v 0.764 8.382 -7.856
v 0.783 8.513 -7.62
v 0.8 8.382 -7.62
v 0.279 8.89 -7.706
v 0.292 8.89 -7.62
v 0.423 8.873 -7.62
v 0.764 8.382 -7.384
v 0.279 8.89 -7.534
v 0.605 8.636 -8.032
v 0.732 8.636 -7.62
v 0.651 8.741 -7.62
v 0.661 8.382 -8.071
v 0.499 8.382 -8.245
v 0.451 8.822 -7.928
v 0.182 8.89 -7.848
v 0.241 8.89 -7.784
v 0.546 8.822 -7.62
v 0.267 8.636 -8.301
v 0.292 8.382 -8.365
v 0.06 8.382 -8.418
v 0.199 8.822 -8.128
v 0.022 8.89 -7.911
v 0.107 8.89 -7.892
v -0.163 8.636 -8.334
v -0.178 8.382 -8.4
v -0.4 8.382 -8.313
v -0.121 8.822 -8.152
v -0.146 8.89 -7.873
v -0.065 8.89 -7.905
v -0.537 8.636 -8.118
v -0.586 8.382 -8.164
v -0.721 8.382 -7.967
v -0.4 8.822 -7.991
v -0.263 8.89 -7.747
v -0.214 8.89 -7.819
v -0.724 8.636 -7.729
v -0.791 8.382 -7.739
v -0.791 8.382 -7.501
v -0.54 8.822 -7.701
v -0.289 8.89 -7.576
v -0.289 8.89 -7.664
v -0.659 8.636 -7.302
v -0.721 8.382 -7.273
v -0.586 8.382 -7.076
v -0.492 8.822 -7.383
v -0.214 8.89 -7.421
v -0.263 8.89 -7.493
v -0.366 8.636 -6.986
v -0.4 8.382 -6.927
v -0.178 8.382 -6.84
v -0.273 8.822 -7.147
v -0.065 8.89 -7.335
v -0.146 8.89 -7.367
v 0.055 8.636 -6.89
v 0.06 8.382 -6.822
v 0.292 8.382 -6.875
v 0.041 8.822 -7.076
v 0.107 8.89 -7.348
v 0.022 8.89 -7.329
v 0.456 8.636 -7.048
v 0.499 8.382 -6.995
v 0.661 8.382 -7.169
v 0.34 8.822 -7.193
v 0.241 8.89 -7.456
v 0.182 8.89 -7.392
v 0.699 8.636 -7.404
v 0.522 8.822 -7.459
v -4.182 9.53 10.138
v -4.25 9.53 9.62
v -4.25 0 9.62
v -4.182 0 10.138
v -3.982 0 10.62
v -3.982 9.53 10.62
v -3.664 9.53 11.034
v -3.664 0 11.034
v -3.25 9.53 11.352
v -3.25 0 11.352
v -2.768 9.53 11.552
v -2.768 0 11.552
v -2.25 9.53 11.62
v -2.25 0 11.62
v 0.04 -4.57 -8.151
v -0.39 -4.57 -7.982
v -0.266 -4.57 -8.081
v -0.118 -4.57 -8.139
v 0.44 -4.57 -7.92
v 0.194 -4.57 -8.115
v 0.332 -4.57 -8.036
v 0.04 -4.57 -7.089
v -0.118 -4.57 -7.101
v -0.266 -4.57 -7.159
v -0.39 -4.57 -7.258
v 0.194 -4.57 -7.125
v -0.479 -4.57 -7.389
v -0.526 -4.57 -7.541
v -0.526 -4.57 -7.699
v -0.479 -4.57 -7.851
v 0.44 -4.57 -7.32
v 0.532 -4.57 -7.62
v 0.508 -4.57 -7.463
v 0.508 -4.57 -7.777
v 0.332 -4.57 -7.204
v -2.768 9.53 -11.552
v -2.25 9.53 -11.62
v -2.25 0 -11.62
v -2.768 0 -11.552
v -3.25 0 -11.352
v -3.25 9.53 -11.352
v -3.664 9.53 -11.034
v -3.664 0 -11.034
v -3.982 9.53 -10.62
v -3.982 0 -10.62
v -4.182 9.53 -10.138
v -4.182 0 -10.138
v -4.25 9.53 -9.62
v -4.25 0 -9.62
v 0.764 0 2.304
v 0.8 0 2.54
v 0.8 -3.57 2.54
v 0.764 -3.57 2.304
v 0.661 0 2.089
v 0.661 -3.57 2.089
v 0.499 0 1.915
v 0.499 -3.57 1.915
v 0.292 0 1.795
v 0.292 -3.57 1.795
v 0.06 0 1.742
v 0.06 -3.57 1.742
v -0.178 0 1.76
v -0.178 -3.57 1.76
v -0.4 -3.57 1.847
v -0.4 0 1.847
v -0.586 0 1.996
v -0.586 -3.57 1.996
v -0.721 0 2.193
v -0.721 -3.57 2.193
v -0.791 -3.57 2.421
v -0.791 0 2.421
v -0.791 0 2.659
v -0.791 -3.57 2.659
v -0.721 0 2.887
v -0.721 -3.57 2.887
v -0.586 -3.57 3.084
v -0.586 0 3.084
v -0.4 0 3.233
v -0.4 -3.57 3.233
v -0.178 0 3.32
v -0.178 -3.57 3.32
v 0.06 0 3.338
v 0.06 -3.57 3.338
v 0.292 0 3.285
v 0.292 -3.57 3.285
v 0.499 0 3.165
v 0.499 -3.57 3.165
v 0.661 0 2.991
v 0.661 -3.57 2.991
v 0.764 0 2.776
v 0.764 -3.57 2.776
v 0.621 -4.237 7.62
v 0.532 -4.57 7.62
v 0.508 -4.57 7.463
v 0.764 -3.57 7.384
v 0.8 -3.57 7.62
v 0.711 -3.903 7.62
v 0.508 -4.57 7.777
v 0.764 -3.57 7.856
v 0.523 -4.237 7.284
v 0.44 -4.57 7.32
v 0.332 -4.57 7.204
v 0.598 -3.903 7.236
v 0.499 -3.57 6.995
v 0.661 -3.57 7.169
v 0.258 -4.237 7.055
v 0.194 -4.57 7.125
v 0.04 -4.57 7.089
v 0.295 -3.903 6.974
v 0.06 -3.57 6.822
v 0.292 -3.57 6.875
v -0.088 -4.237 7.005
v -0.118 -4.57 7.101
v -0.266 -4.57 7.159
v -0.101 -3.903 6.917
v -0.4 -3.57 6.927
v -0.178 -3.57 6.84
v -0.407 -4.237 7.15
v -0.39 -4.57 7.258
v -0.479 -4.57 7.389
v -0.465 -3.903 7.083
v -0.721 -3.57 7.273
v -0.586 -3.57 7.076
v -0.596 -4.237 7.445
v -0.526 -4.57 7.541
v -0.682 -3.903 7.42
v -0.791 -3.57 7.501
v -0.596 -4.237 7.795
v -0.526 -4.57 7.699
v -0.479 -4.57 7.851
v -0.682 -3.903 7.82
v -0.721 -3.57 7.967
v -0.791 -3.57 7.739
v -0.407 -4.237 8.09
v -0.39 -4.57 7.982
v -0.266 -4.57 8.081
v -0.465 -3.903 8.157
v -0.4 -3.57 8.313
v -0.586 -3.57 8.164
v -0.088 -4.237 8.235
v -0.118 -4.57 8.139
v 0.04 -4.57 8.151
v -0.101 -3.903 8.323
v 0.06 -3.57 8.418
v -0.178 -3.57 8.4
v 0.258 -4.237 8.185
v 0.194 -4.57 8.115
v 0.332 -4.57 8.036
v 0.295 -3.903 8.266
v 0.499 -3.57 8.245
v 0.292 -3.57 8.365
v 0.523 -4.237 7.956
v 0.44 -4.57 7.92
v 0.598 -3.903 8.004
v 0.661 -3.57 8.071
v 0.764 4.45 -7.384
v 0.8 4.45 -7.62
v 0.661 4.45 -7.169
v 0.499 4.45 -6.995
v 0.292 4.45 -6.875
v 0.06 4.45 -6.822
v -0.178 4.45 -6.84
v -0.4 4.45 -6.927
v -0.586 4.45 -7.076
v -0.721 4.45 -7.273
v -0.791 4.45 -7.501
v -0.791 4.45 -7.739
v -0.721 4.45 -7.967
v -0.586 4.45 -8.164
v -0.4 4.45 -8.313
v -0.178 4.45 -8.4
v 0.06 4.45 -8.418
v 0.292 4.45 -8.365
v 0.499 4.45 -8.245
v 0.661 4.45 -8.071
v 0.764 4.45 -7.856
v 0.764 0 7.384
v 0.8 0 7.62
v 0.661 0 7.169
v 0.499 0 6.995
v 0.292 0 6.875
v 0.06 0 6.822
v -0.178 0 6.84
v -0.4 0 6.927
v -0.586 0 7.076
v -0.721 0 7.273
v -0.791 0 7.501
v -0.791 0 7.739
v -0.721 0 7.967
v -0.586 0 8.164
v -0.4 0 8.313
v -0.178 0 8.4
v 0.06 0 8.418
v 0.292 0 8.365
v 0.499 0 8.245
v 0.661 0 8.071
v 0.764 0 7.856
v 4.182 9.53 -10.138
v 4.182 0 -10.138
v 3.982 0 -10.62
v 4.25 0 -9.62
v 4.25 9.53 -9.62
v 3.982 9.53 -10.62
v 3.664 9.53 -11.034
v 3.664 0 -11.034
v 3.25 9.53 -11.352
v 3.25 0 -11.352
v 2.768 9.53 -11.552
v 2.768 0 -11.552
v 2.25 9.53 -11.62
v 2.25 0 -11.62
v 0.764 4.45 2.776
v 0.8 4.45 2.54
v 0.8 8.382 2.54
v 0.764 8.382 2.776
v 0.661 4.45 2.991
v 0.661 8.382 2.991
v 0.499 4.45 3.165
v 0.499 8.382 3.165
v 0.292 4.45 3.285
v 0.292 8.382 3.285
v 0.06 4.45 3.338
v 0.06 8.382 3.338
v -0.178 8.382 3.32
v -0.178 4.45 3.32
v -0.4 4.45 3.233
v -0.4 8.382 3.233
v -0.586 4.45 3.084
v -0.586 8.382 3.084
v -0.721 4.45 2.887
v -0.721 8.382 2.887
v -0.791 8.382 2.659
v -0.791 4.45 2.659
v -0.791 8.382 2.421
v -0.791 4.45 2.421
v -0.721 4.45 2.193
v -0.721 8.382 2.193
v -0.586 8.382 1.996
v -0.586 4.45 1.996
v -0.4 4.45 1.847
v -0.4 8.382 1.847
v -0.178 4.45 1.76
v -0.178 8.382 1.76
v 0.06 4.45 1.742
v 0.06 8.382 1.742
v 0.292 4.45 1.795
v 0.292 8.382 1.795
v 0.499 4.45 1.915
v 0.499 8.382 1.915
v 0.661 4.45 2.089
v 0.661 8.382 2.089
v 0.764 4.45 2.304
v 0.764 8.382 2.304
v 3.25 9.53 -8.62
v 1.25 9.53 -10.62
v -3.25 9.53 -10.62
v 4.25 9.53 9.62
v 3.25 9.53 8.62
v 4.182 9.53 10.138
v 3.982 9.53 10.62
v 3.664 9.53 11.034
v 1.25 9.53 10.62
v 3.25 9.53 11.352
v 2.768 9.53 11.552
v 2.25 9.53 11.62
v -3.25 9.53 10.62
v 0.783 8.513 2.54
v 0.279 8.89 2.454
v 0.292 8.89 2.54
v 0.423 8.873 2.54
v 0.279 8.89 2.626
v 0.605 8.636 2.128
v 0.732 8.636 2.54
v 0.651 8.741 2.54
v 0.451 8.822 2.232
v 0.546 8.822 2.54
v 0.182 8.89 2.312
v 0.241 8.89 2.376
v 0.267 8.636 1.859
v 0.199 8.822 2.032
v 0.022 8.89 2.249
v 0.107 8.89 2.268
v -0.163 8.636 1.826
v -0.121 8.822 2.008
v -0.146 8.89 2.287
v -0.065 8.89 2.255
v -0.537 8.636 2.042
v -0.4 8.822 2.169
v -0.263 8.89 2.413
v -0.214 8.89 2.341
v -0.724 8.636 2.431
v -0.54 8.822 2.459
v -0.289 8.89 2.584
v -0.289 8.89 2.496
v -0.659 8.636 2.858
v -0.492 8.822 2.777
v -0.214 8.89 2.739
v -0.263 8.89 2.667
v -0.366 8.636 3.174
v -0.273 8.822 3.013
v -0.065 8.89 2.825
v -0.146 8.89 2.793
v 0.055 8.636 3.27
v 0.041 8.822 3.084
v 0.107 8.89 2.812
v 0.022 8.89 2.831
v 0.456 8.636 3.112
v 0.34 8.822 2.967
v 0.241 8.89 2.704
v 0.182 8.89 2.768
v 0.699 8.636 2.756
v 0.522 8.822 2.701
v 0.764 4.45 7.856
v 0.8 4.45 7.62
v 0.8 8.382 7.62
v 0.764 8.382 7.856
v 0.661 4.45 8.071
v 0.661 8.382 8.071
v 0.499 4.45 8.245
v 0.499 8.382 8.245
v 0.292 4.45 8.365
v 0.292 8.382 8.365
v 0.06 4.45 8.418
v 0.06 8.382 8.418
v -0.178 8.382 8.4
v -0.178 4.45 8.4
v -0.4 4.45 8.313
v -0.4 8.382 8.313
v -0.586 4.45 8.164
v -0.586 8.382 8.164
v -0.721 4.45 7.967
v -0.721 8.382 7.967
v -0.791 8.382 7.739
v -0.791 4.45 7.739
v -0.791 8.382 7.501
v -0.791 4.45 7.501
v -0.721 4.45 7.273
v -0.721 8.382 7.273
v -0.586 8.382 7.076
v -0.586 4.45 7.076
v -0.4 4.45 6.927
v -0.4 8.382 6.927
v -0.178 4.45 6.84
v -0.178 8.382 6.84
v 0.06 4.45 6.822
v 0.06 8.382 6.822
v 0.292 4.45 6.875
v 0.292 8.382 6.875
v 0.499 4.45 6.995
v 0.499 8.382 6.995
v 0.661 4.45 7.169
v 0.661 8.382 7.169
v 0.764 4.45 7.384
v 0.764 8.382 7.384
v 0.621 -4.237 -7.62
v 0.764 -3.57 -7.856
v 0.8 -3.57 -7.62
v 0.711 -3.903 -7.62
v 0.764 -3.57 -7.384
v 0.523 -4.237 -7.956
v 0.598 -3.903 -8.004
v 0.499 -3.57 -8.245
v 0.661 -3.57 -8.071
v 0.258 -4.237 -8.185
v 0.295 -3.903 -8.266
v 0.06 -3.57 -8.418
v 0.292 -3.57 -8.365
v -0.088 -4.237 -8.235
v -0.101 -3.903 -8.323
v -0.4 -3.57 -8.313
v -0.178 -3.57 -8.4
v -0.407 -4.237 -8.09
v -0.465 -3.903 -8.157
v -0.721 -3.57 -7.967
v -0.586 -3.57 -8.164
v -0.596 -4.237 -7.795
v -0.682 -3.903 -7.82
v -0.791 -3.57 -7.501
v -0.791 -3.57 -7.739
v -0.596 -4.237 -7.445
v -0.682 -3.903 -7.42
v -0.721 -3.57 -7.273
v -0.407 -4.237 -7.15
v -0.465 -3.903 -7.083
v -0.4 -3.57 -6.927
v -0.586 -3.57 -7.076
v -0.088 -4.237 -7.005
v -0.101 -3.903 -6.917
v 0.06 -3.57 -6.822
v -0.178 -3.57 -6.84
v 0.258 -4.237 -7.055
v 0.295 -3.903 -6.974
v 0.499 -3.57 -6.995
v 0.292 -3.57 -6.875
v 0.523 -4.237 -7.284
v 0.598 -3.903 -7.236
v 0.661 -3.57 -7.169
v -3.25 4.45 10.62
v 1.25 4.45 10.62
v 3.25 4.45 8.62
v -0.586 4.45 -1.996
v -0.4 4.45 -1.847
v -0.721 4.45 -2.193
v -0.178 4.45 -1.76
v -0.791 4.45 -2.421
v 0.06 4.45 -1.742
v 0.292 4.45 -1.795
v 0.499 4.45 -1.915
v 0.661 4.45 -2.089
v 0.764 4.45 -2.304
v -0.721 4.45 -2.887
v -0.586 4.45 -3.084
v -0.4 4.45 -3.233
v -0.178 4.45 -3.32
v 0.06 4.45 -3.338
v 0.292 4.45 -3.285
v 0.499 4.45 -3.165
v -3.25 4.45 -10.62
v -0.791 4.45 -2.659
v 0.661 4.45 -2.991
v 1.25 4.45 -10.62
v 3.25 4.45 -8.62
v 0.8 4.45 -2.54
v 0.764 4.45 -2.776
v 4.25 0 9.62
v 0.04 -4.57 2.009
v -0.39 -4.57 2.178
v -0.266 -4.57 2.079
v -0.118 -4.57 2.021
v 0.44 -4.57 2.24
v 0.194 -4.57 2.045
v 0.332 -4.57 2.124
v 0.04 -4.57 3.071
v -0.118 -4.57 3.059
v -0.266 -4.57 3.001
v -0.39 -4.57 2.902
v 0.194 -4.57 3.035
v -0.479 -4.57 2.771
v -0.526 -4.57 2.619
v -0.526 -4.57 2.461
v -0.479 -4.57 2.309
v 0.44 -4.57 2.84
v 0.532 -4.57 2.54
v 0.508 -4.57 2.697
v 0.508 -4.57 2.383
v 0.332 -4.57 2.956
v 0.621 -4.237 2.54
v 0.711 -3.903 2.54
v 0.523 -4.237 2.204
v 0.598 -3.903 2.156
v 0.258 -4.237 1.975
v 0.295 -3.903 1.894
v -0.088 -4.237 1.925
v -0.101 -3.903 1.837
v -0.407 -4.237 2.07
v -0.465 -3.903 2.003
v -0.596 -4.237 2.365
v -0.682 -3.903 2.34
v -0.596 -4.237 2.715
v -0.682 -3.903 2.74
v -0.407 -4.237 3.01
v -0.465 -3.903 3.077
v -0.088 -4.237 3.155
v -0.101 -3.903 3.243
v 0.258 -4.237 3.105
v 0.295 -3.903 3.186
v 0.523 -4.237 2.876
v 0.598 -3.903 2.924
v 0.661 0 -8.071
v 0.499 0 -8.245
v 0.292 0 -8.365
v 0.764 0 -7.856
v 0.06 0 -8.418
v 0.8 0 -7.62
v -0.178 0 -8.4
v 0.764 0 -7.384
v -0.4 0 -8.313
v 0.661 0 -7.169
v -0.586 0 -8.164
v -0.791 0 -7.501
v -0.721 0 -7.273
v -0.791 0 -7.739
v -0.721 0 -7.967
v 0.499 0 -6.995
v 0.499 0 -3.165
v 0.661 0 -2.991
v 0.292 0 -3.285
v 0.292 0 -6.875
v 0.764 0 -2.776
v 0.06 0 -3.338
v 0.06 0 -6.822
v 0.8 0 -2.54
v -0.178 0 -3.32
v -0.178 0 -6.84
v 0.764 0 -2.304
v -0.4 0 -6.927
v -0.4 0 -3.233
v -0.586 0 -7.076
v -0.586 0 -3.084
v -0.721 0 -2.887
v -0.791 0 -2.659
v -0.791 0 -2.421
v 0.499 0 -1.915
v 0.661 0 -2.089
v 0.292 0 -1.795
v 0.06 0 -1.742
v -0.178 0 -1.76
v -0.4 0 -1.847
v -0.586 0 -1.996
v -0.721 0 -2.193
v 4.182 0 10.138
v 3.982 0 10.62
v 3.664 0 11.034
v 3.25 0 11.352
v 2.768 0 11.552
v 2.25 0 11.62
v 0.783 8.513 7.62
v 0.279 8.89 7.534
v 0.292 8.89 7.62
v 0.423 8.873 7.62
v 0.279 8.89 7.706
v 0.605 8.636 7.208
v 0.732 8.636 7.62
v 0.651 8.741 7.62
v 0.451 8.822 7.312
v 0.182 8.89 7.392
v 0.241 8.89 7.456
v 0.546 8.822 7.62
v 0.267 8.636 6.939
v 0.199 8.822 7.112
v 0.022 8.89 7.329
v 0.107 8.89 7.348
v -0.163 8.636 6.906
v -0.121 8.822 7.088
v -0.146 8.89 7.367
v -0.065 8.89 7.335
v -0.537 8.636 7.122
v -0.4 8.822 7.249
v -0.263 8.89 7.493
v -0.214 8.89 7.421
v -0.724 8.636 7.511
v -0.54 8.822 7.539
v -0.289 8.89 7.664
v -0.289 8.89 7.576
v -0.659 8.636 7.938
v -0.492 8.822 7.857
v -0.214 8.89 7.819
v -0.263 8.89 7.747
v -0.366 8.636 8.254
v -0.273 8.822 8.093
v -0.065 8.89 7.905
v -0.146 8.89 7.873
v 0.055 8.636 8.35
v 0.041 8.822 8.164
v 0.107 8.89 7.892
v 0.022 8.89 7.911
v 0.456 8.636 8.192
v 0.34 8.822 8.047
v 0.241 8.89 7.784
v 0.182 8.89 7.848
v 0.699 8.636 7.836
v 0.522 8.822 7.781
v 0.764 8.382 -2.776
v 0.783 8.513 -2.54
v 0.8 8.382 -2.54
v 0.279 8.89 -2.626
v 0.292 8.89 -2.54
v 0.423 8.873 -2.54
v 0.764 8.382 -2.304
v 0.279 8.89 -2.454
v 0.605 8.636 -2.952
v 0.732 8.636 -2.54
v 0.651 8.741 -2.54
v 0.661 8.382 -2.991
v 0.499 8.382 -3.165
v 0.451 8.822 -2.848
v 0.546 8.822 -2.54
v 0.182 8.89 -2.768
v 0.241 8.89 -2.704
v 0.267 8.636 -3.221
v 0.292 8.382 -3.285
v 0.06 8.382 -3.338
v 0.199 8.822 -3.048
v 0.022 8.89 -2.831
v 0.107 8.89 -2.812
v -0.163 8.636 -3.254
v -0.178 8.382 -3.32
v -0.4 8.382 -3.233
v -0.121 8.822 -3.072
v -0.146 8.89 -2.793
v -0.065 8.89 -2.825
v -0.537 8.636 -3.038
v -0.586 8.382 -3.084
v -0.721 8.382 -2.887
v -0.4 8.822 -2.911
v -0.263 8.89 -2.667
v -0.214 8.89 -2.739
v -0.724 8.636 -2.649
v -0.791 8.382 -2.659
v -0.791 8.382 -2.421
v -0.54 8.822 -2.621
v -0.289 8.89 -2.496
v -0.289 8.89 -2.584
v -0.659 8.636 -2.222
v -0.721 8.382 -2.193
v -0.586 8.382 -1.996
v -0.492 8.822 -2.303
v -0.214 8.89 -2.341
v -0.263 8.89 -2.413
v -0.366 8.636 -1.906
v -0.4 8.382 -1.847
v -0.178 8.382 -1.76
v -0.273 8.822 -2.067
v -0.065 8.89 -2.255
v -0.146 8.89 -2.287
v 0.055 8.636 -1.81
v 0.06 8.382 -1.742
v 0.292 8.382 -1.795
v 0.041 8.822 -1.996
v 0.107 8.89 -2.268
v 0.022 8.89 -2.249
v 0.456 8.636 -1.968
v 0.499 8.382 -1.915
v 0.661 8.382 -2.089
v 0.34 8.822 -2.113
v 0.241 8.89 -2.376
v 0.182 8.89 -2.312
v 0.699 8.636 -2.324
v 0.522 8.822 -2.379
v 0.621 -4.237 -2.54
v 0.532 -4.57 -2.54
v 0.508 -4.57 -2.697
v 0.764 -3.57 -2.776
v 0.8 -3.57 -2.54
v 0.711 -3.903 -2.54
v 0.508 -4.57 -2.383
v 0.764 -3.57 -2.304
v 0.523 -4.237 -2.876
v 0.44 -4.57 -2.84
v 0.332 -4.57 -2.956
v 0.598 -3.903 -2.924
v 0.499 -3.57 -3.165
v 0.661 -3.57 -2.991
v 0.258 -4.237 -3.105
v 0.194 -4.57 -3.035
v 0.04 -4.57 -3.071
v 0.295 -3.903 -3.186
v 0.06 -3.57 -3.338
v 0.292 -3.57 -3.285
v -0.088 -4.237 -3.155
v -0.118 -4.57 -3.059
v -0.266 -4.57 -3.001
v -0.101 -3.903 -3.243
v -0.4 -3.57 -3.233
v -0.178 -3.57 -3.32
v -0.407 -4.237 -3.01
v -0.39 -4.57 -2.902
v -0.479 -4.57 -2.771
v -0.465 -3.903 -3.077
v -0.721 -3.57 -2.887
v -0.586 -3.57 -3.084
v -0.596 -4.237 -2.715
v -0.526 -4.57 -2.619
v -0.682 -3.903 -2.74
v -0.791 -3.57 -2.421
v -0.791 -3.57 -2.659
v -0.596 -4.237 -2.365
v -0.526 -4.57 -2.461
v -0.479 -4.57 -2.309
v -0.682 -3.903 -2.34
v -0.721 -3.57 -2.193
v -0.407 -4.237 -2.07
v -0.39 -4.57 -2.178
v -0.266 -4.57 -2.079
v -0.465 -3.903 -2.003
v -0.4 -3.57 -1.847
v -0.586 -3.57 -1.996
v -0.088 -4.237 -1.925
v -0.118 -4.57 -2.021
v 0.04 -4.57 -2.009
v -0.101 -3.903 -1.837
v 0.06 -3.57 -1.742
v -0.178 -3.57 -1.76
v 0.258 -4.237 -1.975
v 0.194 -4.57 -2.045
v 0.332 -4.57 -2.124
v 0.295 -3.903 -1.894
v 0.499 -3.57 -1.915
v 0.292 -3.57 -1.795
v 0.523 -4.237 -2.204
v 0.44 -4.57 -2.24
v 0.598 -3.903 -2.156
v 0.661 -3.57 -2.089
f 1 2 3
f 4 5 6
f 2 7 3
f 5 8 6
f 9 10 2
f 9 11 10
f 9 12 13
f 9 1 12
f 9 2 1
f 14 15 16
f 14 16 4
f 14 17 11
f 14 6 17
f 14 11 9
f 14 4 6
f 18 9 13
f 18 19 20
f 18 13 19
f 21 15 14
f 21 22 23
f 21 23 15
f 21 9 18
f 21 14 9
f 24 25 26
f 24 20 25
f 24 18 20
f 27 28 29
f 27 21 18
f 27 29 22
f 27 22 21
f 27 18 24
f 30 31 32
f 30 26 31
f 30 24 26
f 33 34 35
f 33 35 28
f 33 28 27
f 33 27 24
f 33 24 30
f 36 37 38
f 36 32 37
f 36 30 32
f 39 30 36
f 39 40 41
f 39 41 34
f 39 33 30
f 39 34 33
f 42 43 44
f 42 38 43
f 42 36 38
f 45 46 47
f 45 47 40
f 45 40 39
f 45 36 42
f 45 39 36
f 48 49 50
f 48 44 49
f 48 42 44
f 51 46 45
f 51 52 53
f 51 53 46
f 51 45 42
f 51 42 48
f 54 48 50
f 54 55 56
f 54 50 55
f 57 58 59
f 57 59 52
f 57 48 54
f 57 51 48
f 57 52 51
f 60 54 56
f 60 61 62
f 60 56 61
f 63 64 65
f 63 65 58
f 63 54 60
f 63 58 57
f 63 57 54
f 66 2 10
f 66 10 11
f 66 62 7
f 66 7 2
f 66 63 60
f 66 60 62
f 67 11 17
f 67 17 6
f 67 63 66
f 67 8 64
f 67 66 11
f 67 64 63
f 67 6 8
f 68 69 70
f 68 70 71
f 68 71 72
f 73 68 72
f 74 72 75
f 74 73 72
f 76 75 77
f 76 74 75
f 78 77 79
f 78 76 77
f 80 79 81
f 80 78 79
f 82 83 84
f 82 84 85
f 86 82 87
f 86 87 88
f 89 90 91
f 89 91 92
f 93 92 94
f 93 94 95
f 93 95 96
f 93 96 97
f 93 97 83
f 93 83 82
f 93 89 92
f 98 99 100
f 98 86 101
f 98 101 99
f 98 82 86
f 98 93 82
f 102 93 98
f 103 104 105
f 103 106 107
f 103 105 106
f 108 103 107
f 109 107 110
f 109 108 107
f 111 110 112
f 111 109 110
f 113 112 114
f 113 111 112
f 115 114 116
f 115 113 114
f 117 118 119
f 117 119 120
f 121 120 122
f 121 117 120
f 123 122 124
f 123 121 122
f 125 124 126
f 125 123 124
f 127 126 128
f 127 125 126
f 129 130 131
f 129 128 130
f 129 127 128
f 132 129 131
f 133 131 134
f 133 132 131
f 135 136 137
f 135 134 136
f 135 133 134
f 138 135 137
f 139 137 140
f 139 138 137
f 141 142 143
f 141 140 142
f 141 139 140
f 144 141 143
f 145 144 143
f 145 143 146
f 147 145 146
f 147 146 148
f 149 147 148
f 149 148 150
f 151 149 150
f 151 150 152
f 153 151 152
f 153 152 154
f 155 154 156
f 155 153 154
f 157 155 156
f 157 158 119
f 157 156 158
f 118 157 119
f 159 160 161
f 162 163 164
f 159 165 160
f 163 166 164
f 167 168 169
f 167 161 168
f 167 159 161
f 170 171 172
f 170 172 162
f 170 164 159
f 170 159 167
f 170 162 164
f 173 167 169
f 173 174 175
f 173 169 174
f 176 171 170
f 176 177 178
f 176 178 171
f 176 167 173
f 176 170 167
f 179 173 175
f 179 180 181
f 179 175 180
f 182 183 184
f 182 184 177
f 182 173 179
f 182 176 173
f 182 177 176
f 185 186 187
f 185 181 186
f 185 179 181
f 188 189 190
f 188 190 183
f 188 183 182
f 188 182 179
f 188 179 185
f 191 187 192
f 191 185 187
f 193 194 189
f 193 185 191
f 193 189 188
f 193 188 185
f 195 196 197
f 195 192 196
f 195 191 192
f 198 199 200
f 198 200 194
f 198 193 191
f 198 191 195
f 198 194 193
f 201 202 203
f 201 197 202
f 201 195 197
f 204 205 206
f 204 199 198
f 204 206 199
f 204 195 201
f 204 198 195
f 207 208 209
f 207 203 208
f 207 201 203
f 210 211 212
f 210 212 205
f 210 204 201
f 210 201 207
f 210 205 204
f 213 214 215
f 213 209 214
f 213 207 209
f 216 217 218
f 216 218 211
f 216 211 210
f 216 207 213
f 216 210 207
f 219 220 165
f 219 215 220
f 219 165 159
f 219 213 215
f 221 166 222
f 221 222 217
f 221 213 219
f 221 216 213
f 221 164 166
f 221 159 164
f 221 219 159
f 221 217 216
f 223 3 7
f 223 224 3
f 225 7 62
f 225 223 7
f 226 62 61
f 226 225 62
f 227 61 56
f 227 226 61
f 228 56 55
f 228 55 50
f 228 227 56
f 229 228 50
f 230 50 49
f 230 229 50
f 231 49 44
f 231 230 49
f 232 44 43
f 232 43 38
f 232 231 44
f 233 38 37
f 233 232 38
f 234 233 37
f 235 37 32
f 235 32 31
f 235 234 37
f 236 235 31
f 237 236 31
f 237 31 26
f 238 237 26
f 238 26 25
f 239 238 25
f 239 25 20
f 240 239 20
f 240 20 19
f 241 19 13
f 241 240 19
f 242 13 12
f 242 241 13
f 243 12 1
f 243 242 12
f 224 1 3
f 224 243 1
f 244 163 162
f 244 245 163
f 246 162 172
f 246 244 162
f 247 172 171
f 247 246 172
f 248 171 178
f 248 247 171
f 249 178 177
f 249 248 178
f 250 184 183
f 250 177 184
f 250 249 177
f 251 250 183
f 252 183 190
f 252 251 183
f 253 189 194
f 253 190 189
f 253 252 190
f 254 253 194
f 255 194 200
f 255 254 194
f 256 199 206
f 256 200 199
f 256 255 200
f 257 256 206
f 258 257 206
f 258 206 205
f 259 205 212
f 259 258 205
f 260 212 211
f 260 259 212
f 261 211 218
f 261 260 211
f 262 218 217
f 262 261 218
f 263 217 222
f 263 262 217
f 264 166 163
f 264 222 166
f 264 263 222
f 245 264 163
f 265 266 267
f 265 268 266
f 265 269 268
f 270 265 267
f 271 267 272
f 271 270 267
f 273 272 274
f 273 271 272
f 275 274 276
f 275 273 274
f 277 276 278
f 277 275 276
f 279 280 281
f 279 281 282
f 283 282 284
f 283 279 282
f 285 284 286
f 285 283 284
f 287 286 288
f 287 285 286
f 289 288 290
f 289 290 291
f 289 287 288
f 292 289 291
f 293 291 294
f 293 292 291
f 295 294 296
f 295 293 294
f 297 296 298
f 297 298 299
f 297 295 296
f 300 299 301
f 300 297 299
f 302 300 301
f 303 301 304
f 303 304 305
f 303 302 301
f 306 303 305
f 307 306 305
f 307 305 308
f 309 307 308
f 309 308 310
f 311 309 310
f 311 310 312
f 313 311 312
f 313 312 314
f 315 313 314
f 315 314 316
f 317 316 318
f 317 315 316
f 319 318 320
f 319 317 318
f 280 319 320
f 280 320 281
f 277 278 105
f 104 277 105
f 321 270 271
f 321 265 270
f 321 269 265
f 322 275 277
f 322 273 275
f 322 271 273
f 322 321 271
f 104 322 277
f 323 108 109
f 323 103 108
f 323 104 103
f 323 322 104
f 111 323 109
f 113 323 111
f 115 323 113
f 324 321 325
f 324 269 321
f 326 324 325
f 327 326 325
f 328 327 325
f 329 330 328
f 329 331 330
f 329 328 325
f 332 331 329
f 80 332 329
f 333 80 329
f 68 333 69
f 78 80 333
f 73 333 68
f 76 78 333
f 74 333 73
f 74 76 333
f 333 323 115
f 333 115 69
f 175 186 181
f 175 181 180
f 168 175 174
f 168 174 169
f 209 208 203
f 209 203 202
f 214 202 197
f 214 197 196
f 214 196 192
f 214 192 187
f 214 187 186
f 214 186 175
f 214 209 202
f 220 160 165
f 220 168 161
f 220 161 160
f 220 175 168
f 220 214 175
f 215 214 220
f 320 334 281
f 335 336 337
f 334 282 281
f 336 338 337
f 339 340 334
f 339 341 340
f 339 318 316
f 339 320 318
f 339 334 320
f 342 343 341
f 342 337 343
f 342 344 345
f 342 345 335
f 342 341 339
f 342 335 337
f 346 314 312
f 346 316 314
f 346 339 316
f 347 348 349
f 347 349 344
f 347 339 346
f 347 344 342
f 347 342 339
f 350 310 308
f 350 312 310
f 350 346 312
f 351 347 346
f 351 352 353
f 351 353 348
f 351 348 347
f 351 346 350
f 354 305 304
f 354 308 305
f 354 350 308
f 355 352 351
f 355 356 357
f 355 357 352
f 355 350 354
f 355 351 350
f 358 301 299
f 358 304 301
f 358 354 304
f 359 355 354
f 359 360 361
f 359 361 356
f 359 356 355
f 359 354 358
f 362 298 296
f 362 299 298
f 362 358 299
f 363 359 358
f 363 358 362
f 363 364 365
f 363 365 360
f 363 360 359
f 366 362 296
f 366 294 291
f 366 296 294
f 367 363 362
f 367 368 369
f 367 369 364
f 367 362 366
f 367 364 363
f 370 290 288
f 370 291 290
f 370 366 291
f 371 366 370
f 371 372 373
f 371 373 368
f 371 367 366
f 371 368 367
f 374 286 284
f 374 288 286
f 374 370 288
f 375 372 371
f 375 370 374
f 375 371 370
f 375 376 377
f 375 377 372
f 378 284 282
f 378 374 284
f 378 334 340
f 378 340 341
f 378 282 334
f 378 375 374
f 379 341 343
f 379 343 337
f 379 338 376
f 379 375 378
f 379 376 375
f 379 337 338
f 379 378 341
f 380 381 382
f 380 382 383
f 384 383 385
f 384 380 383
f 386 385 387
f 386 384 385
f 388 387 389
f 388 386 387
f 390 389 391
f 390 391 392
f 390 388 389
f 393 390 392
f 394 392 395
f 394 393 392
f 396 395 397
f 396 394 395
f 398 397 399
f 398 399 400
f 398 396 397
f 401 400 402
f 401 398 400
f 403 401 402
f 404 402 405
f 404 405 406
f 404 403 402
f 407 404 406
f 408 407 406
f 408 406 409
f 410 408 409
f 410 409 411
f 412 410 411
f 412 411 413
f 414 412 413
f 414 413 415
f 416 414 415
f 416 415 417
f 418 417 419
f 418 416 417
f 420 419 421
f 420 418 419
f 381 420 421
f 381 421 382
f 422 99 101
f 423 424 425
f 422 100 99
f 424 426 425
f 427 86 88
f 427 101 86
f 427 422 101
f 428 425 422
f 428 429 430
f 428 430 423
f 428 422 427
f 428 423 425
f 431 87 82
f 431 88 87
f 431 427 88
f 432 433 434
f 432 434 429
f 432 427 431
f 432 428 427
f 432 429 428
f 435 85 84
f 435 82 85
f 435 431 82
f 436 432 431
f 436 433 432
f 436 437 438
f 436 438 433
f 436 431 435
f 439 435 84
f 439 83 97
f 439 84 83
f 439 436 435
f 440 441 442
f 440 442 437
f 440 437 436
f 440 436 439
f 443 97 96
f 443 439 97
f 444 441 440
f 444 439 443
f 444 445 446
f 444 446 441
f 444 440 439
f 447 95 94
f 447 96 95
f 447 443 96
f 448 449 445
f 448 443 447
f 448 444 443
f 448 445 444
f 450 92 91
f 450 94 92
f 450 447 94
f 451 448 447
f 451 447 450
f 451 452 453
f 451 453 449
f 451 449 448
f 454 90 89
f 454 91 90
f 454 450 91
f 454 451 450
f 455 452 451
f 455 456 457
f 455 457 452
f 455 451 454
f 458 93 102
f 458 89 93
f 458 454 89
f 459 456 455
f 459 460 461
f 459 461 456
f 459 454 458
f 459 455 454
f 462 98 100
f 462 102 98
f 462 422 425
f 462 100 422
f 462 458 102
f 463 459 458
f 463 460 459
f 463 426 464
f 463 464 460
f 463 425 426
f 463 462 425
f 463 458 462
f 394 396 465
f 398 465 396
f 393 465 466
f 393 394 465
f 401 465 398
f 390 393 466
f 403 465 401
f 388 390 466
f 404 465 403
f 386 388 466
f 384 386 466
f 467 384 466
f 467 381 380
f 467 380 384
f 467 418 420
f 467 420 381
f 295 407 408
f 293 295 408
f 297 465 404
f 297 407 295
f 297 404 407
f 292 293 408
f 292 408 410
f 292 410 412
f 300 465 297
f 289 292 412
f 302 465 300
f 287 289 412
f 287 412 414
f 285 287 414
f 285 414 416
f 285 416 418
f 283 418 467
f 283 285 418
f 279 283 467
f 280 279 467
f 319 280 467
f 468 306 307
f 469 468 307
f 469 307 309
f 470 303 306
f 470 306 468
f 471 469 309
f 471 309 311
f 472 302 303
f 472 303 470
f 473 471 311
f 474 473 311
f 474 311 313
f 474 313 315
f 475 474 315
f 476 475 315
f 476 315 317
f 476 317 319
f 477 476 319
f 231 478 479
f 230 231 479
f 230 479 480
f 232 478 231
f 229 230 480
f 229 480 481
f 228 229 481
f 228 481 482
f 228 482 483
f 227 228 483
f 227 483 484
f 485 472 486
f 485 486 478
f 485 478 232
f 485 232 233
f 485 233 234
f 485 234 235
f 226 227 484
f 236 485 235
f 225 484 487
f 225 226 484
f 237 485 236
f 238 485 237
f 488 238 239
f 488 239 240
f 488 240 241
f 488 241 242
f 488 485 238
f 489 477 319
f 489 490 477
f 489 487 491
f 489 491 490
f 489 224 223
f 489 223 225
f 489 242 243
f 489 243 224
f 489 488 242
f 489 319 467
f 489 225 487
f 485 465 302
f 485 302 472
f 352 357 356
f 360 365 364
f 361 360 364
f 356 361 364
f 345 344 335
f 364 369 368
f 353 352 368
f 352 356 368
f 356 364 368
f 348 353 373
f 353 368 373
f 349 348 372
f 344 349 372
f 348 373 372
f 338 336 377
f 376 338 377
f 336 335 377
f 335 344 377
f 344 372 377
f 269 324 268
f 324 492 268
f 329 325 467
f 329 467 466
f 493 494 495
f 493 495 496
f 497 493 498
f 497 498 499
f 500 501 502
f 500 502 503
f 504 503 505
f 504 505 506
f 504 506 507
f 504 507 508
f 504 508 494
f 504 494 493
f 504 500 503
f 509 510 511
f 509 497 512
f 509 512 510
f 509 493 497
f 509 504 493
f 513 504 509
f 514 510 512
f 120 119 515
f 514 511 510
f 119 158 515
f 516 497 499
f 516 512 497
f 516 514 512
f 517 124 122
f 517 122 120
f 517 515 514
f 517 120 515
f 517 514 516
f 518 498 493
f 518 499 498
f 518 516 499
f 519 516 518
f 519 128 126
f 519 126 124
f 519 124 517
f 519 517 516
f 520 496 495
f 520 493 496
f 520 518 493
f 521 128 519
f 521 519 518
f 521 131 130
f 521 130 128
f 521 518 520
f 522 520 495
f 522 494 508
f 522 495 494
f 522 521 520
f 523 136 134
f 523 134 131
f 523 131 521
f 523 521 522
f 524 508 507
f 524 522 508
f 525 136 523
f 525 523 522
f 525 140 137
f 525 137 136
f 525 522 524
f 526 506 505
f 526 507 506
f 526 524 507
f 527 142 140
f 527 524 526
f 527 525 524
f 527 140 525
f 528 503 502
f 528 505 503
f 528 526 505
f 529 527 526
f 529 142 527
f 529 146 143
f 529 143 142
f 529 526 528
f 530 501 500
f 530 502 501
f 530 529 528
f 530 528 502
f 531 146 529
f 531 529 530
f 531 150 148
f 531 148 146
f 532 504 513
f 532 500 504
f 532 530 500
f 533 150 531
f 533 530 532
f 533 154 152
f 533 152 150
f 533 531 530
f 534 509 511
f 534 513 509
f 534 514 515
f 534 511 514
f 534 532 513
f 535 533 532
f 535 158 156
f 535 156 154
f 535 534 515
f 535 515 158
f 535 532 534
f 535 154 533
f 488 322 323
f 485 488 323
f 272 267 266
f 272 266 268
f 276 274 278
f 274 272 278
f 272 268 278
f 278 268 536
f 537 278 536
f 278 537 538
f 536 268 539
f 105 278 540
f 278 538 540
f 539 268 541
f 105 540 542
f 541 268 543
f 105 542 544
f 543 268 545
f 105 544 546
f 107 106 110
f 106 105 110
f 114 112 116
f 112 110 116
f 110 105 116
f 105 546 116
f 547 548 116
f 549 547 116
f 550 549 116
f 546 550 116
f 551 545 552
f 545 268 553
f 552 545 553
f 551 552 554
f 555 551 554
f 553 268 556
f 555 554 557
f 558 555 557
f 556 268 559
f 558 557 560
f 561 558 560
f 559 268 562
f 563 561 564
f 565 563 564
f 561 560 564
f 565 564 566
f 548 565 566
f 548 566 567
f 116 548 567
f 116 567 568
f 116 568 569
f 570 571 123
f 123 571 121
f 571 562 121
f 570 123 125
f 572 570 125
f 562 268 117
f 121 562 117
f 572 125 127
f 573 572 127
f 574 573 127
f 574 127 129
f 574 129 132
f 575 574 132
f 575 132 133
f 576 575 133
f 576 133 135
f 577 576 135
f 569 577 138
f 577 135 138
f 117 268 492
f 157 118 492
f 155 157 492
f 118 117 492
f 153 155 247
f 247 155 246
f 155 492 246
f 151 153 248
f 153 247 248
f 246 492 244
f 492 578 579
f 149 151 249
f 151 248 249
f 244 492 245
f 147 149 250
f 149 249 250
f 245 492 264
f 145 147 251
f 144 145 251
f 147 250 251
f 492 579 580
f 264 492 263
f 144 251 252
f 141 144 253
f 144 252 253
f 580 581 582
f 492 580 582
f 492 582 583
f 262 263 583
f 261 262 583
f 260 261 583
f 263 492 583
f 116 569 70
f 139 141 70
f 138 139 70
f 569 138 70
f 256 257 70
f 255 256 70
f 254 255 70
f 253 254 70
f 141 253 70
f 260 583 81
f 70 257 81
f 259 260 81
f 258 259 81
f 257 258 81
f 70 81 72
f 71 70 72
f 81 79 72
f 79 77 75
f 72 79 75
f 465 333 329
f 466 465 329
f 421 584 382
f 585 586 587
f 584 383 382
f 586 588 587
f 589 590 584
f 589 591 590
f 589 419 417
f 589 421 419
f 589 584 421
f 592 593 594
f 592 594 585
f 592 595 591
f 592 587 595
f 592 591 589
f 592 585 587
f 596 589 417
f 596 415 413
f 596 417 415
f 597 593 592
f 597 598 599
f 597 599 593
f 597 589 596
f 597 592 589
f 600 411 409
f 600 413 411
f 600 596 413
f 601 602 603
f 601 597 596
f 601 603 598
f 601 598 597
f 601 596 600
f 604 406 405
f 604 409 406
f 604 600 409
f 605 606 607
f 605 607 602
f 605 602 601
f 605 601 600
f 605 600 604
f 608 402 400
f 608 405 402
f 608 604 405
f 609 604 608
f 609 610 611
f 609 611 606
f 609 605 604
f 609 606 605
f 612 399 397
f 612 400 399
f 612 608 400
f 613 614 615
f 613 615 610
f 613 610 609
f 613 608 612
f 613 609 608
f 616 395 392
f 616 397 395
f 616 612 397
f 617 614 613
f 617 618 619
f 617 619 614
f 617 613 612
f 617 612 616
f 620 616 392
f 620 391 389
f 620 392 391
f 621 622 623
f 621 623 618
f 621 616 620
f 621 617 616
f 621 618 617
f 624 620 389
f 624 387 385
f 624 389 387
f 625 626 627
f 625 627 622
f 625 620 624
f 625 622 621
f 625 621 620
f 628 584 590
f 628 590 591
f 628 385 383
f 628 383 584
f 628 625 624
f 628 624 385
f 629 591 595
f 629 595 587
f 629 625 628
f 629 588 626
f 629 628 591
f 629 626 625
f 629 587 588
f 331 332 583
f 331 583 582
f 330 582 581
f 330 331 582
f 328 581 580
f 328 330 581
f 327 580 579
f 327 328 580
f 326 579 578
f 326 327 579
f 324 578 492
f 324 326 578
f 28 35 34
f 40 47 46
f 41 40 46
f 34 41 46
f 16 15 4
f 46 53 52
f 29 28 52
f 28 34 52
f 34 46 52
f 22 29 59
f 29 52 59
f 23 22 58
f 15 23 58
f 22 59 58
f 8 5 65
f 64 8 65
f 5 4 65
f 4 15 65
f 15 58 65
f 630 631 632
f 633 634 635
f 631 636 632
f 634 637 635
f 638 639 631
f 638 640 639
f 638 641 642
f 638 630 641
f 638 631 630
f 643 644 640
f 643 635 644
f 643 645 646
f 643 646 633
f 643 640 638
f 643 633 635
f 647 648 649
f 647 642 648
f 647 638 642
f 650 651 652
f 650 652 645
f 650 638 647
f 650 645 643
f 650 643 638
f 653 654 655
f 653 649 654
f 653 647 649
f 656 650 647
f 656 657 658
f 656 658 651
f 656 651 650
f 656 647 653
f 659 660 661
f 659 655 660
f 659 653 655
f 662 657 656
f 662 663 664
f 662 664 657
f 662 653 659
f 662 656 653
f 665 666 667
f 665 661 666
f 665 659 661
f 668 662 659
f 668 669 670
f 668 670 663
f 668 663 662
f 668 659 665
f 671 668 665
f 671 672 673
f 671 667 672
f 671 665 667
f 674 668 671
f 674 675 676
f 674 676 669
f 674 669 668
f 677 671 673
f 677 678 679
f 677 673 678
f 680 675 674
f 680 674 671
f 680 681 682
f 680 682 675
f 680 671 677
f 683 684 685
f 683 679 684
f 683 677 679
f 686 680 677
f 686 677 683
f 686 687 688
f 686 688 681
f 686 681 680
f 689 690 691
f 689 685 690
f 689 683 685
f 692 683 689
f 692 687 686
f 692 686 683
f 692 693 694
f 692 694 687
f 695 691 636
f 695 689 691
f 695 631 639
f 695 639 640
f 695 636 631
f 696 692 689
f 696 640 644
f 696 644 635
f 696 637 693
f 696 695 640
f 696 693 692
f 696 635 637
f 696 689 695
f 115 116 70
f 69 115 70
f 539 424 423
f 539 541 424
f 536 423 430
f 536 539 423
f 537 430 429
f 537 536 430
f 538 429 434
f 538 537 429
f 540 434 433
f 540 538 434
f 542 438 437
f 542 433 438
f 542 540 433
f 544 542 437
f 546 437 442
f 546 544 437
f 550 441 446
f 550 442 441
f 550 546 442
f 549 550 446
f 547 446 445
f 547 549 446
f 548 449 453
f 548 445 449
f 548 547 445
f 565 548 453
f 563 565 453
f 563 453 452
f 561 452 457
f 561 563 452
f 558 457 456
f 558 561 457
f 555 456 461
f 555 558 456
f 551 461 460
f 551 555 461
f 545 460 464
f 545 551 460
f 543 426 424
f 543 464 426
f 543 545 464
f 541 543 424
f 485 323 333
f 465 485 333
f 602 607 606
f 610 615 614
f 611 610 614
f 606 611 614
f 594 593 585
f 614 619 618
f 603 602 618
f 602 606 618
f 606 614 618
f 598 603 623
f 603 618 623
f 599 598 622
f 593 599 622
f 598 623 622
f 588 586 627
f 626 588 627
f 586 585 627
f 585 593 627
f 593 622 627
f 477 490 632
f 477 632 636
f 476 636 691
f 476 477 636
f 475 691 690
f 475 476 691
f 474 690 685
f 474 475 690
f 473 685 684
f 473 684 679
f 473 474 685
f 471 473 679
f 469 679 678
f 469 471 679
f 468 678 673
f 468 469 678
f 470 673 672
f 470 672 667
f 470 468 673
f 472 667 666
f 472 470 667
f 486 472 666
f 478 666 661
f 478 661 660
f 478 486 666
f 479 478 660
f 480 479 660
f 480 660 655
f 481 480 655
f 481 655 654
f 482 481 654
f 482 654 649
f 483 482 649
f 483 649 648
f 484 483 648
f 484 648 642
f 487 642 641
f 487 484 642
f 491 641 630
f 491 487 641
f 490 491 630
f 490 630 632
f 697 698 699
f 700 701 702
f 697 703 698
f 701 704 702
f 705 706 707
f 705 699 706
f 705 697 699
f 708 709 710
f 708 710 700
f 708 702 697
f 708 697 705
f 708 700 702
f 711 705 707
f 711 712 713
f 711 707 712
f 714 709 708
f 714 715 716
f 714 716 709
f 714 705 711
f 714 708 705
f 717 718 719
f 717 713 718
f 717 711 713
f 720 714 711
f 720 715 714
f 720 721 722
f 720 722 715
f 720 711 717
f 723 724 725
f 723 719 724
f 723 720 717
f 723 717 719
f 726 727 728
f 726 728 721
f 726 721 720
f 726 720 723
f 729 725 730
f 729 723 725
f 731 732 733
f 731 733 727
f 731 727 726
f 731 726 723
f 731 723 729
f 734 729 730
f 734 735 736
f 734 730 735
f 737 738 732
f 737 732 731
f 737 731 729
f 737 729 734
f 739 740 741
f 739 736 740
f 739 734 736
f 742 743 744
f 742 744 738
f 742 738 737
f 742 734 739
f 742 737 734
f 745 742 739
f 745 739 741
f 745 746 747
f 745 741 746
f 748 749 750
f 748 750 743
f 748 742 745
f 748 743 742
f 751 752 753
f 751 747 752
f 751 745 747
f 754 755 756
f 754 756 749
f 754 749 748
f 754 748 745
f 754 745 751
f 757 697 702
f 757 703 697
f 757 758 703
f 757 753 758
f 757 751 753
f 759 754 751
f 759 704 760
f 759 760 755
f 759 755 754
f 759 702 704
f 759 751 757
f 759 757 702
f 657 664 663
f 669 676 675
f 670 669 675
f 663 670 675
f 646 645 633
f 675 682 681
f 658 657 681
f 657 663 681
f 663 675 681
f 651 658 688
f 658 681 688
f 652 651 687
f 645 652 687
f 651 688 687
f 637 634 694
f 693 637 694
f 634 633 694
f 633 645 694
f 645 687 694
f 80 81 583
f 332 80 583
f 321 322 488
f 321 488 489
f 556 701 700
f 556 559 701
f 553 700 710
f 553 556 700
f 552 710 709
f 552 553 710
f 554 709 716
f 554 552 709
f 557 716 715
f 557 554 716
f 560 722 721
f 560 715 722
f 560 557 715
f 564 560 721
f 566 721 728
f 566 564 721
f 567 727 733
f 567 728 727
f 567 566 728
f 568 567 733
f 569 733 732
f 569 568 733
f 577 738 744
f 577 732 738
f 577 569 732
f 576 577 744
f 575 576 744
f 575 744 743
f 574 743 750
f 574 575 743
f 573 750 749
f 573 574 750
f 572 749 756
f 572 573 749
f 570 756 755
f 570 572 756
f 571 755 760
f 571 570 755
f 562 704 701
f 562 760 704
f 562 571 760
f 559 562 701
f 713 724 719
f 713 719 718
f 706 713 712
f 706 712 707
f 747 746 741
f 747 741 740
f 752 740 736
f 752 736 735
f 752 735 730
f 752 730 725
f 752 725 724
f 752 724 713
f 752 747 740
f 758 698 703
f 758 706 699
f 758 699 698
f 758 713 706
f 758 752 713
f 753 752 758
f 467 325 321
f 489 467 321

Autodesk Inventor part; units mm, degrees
ref_plane "YZ Plane" through (0, 0, 0) normal (1, 0, 0) x (0, 1, 0)
ref_plane "XZ Plane" through (0, 0, 0) normal (0, 1, 0) x (-1, 0, 0)
ref_plane "XY Plane" through (0, 0, 0) normal (0, 0, 1) x (1, 0, 0)
sketch "Sketch1" plane through (0, 0, 0) normal (0, 1, 0) x (-1, 0, 0)
  line L0 (4.25, 11.62) -> (-4.25, 11.62)
  line L1 (-4.25, 11.62) -> (-4.25, -11.62)
  line L2 (-4.25, -11.62) -> (4.25, -11.62)
  line L3 (4.25, -11.62) -> (4.25, 11.62)
  point P0 (0, 0)
  dimension "d0" = 23.24
  dimension "d1" = 11.62
  dimension "d2" = 8.5
  dimension "d3" = 4.25
extrude "Extrusion1" add sketch "Sketch1" along normal blind 9.53
fillet "Fillet1" radius 2 4 edges at (4.25, 4.765, 11.62) (-4.25, 4.765, 11.62) (-4.25, 4.765, -11.62) (4.25, 4.765, -11.62)
sketch "Sketch2" plane through (0, 9.53, 0) normal (0, 1, 0) x (1, 0, 0)
  line L0 (-3.25, -10.62) -> (3.25, -10.62)
  line L1 (3.25, -10.62) -> (3.25, 10.62)
  line L2 (3.25, 10.62) -> (-3.25, 10.62)
  line L3 (-3.25, 10.62) -> (-3.25, -10.62)
  line L4 (4.25, 11.62) -> (-4.25, 11.62) projected
  line L5 (-4.25, 11.62) -> (-4.25, -11.62) projected
  line L6 (-4.25, -11.62) -> (4.25, -11.62) projected
  line L7 (4.25, -11.62) -> (4.25, 11.62) projected
  line L8 (1.25, 10.62) -> (3.25, 8.62)
  line L9 (3.25, -8.62) -> (1.25, -10.62)
  point P0 (0, 0)
  dimension "d6" = 1
  dimension "d7" = 1
  dimension "d8" = 1
  dimension "d9" = 1
  dimension "d11" = 45
  dimension "d12" = 45
  dimension "d13" = 2
  dimension "d14" = 2
extrude "Extrusion2" cut sketch "Sketch2" against normal blind 5.08 contours L3 L2 L8 L1 L9 L0
sketch "Sketch3" plane through (0, 0, 0) normal (0, -1, 0) x (1, 0, 0)
  circle A0 centre (0, 7.62) radius 0.8
  point P0 (0, 0)
  dimension "d17" = 1.6
  dimension "d18" = 7.62
extrude "Extrusion3" add sketch "Sketch3" along normal blind 4.57 and the other way blind 8.89
fillet "Fillet2" radius 0.508 1 edges at (-0.8, 8.89, 7.62)
chamfer "Chamfer1" distance 1 angle 15 1 edges at (-0.8, -4.57, 7.62) measured on face at (0.7974, -3.0467, 7.5556)
pattern_linear "Rectangular Pattern1" count 4 spacing 5.08 along (0, 0, -1) of "Extrusion3", "Fillet2", "Chamfer1"
properties part number "Molex_4x508_Conn"
